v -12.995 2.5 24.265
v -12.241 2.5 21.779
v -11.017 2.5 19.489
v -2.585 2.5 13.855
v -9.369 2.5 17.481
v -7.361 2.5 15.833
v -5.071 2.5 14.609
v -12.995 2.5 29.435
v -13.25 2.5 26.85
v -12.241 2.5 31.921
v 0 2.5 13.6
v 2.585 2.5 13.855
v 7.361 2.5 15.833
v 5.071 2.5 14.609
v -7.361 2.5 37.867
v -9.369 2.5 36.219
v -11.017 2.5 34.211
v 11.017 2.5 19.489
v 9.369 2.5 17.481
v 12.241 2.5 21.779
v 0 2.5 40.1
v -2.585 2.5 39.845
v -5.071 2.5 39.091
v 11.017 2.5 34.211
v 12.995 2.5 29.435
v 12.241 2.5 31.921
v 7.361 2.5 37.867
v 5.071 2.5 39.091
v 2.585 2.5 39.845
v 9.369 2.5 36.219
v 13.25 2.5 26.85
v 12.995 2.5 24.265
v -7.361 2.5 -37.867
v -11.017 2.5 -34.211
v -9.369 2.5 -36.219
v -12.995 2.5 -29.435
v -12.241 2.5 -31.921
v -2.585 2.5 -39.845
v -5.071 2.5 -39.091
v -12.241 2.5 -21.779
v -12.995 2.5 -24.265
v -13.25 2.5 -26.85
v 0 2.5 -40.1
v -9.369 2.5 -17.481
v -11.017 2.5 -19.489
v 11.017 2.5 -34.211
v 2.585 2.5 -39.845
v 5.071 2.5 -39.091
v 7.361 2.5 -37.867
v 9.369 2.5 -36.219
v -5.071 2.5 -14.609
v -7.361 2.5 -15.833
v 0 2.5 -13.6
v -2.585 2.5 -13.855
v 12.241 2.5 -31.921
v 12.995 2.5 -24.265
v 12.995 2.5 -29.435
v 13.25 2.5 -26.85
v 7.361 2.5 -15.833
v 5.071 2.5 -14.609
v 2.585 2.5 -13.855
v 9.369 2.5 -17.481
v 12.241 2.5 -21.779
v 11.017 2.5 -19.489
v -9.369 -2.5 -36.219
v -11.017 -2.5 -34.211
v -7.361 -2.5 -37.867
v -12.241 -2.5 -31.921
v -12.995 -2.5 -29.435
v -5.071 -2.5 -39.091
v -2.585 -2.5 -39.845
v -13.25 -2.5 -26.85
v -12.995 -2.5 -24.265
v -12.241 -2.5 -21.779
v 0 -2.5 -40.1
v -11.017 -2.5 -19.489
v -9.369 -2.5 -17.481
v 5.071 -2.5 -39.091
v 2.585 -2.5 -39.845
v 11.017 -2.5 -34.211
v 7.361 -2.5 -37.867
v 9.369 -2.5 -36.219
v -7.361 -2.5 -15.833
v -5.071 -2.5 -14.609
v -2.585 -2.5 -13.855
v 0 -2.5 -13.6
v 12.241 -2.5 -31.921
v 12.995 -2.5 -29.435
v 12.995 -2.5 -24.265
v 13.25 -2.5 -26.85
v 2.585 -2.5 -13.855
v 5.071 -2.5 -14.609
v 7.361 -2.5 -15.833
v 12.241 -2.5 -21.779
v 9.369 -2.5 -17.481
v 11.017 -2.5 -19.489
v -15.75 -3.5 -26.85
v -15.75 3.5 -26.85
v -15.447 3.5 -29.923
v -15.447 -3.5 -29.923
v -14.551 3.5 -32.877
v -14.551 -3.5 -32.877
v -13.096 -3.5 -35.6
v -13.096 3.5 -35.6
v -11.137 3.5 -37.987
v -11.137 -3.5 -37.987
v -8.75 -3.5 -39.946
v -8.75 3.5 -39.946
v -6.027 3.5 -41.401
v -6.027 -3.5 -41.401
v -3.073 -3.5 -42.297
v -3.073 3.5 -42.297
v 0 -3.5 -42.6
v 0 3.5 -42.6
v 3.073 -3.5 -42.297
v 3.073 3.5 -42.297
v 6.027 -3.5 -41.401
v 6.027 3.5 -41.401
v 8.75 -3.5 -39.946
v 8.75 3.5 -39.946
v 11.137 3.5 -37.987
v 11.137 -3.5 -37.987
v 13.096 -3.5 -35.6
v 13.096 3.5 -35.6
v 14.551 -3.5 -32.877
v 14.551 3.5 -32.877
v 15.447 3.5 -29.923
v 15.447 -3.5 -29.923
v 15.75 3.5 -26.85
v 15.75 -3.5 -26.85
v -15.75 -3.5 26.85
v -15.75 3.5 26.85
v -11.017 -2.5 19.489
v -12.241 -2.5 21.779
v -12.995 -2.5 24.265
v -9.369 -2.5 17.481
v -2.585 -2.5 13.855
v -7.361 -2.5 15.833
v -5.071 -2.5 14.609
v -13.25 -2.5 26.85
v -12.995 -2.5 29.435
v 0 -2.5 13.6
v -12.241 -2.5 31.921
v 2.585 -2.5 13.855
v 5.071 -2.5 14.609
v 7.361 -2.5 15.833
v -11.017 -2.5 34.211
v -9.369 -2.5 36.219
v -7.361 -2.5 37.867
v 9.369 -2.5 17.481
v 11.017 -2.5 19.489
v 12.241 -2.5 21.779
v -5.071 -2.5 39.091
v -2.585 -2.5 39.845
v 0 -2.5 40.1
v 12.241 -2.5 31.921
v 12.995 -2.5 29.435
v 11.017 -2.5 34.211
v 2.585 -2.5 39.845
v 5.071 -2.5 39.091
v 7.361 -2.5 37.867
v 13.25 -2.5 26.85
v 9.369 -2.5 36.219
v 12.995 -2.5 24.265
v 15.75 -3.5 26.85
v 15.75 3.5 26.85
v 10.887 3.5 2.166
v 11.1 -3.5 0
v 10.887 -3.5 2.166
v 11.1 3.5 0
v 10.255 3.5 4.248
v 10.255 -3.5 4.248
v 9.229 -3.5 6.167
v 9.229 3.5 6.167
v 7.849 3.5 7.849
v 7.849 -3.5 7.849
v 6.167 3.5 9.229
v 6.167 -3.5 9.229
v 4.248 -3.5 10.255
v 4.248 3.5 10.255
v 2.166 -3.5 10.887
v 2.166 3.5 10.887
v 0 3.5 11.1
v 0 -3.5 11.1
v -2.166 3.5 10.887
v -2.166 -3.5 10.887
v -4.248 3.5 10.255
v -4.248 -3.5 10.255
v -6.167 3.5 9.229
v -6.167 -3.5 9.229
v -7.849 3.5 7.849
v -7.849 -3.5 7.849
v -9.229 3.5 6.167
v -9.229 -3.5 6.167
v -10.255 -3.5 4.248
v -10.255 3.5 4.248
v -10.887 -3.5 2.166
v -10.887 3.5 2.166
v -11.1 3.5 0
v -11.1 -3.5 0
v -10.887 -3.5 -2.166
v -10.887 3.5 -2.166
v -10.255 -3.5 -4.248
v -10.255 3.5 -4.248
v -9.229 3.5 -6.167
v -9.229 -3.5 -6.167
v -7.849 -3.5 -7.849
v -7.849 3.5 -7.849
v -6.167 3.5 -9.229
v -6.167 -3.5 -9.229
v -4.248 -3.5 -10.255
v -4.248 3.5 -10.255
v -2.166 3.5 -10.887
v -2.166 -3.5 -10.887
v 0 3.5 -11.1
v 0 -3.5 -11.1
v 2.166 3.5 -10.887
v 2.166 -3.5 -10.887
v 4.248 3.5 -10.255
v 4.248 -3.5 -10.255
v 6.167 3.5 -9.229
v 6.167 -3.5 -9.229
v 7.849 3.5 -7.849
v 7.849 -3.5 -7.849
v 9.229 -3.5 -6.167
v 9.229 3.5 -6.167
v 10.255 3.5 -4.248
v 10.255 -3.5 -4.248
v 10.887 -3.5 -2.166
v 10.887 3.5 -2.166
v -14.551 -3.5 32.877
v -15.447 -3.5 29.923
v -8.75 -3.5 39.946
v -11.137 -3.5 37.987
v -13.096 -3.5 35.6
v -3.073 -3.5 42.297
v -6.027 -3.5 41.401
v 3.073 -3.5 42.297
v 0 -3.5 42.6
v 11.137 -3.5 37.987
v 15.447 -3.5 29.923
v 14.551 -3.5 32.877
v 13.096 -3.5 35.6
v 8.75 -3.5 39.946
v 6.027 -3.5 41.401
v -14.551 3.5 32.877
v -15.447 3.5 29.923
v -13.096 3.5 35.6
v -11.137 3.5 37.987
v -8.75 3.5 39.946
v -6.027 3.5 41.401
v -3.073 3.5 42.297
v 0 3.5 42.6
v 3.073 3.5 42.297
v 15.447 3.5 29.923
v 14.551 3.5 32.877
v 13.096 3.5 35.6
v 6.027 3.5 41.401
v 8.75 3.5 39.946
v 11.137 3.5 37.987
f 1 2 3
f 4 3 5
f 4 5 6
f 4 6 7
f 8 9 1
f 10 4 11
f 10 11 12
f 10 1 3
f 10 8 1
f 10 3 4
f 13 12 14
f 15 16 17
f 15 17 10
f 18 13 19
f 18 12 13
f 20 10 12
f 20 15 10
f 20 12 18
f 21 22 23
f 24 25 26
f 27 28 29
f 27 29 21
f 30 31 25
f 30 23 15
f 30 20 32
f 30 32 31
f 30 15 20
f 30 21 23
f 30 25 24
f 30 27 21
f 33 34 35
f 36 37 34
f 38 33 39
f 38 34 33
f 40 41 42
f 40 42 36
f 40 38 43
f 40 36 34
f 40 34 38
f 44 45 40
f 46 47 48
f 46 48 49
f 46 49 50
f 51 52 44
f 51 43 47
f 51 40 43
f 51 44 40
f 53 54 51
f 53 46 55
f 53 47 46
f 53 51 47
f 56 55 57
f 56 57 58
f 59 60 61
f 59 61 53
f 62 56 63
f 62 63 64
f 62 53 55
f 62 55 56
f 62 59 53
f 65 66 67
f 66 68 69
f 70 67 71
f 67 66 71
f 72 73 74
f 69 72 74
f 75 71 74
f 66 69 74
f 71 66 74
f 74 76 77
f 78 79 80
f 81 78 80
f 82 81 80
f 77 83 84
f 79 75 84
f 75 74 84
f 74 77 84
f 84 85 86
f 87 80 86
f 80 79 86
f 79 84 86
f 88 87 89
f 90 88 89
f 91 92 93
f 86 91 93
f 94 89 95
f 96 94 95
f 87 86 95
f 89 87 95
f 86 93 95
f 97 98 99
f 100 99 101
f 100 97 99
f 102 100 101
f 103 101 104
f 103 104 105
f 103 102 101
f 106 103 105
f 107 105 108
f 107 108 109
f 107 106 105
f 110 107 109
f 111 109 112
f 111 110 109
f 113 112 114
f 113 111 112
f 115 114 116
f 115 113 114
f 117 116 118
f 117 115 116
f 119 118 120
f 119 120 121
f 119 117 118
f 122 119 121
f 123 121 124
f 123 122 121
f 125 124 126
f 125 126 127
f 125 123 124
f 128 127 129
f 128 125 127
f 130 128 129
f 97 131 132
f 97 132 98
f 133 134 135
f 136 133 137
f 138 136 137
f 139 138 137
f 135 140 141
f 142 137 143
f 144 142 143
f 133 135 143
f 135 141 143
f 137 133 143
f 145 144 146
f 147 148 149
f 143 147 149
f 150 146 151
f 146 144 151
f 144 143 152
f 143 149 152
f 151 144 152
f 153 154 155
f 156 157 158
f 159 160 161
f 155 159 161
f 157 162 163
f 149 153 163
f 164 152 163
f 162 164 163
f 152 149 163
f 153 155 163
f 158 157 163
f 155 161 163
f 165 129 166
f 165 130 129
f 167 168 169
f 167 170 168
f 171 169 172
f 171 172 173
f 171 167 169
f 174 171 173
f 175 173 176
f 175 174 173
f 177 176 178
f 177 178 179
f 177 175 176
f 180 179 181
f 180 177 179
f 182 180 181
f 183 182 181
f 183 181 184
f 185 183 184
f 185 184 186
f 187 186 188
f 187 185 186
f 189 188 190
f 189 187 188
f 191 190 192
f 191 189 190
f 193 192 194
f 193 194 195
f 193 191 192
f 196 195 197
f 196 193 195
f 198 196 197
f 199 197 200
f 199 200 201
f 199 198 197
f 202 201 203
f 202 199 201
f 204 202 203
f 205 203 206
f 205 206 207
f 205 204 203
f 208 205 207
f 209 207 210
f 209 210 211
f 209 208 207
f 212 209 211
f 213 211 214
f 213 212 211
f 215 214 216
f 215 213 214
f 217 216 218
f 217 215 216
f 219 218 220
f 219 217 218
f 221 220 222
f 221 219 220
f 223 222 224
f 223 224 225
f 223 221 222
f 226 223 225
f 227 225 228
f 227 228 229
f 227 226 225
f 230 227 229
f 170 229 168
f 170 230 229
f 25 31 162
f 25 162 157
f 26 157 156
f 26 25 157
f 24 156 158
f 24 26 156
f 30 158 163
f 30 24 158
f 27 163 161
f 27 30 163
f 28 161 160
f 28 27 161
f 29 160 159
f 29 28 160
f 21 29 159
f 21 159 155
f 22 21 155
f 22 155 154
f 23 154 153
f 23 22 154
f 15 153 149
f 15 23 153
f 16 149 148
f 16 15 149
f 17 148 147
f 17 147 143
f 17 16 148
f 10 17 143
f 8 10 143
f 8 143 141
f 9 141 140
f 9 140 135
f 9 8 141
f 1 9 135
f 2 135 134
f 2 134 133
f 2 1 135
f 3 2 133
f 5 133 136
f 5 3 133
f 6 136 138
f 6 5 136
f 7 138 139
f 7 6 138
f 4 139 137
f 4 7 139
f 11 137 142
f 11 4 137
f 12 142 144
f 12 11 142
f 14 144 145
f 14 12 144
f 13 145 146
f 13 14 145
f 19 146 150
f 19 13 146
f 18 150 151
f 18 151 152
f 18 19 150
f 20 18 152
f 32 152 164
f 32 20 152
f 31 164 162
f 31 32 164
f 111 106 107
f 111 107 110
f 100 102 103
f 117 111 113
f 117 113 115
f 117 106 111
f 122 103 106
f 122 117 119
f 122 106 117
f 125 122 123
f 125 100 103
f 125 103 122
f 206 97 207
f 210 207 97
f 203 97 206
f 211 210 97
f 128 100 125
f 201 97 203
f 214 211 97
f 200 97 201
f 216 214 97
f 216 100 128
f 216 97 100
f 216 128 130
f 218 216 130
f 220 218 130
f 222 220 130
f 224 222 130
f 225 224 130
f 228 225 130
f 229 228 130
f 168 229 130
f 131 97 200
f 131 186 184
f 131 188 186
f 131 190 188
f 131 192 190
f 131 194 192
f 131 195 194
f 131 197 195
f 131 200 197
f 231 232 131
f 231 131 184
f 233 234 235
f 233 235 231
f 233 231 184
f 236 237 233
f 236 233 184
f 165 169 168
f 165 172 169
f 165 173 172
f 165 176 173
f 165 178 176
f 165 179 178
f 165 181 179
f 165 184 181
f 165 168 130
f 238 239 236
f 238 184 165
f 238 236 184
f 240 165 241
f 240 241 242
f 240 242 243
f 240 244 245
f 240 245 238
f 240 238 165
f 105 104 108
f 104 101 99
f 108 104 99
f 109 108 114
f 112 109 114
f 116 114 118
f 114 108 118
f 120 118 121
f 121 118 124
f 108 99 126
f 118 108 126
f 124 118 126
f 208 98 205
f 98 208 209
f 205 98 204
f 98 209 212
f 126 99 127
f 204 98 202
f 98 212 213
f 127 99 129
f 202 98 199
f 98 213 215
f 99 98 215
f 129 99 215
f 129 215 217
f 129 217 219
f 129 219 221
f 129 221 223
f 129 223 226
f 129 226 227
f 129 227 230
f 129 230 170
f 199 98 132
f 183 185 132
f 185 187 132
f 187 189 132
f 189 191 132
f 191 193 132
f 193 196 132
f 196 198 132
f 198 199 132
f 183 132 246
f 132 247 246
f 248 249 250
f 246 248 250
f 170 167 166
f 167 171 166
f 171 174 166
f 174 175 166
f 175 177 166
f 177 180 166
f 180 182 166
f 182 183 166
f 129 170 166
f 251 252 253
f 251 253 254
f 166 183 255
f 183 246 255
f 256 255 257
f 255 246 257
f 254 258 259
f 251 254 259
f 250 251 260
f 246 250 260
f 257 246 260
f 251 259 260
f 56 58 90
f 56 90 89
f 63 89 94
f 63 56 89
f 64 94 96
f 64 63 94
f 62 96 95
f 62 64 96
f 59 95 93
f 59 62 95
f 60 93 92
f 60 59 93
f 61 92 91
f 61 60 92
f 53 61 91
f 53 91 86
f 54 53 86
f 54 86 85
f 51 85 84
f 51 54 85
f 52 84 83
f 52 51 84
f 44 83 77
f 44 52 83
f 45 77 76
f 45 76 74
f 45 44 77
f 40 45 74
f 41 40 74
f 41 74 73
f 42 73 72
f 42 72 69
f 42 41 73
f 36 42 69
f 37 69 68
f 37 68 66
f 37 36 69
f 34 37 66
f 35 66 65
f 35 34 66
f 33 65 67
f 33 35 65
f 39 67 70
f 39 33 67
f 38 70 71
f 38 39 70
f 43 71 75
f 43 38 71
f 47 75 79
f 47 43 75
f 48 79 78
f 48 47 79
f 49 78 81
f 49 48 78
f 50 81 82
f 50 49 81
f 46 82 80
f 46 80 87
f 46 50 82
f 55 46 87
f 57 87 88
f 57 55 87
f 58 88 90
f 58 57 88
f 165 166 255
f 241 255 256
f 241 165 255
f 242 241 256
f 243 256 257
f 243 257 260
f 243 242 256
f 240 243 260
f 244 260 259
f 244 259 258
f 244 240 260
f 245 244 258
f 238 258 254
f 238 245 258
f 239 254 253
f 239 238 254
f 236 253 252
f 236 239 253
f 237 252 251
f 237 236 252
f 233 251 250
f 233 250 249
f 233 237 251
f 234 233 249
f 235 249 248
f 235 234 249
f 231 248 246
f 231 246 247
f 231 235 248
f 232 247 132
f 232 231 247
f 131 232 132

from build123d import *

# Parameters (mm, degrees)
F0_R     = 13.25
F0_R_2   = 11.1
F1_DEPTH = 3.5
F2_START = 2.5
F2_DEPTH = 1
F3_START = -2.5
F3_DEPTH = 1


with BuildPart() as f1:
    # F0 (on Front) → F1 (new body, symmetric)
    with BuildSketch(Plane.XZ):
        with BuildLine():
            Line((15.75, -26.85), (15.75, 26.85))
            ThreePointArc((15.75, 26.85), (0, 42.6), (-15.75, 26.85))
            Line((-15.75, 26.85), (-15.75, -26.85))
            ThreePointArc((-15.75, -26.85), (0, -42.6), (15.75, -26.85))
        make_face()
        with Locations((0, -26.85)):
            Circle(F0_R, mode=Mode.SUBTRACT)
        Circle(F0_R_2, mode=Mode.SUBTRACT)
        with Locations((0, 26.85)):
            Circle(F0_R, mode=Mode.SUBTRACT)
    extrude(amount=F1_DEPTH, both=True)

    # F0 (on Front) → F2 (join)
    with BuildSketch(Plane.XZ.offset(F2_START)):
        with Locations((0, 26.85)):
            Circle(F0_R)
        with Locations((0, -26.85)):
            Circle(F0_R)
    extrude(amount=F2_DEPTH)

    # F0 (on Front) → F3 (join)
    with BuildSketch(Plane.XZ.offset(F3_START)):
        with Locations((0, 26.85)):
            Circle(F0_R)
        with Locations((0, -26.85)):
            Circle(F0_R)
    extrude(amount=-F3_DEPTH)


solid = f1.part
